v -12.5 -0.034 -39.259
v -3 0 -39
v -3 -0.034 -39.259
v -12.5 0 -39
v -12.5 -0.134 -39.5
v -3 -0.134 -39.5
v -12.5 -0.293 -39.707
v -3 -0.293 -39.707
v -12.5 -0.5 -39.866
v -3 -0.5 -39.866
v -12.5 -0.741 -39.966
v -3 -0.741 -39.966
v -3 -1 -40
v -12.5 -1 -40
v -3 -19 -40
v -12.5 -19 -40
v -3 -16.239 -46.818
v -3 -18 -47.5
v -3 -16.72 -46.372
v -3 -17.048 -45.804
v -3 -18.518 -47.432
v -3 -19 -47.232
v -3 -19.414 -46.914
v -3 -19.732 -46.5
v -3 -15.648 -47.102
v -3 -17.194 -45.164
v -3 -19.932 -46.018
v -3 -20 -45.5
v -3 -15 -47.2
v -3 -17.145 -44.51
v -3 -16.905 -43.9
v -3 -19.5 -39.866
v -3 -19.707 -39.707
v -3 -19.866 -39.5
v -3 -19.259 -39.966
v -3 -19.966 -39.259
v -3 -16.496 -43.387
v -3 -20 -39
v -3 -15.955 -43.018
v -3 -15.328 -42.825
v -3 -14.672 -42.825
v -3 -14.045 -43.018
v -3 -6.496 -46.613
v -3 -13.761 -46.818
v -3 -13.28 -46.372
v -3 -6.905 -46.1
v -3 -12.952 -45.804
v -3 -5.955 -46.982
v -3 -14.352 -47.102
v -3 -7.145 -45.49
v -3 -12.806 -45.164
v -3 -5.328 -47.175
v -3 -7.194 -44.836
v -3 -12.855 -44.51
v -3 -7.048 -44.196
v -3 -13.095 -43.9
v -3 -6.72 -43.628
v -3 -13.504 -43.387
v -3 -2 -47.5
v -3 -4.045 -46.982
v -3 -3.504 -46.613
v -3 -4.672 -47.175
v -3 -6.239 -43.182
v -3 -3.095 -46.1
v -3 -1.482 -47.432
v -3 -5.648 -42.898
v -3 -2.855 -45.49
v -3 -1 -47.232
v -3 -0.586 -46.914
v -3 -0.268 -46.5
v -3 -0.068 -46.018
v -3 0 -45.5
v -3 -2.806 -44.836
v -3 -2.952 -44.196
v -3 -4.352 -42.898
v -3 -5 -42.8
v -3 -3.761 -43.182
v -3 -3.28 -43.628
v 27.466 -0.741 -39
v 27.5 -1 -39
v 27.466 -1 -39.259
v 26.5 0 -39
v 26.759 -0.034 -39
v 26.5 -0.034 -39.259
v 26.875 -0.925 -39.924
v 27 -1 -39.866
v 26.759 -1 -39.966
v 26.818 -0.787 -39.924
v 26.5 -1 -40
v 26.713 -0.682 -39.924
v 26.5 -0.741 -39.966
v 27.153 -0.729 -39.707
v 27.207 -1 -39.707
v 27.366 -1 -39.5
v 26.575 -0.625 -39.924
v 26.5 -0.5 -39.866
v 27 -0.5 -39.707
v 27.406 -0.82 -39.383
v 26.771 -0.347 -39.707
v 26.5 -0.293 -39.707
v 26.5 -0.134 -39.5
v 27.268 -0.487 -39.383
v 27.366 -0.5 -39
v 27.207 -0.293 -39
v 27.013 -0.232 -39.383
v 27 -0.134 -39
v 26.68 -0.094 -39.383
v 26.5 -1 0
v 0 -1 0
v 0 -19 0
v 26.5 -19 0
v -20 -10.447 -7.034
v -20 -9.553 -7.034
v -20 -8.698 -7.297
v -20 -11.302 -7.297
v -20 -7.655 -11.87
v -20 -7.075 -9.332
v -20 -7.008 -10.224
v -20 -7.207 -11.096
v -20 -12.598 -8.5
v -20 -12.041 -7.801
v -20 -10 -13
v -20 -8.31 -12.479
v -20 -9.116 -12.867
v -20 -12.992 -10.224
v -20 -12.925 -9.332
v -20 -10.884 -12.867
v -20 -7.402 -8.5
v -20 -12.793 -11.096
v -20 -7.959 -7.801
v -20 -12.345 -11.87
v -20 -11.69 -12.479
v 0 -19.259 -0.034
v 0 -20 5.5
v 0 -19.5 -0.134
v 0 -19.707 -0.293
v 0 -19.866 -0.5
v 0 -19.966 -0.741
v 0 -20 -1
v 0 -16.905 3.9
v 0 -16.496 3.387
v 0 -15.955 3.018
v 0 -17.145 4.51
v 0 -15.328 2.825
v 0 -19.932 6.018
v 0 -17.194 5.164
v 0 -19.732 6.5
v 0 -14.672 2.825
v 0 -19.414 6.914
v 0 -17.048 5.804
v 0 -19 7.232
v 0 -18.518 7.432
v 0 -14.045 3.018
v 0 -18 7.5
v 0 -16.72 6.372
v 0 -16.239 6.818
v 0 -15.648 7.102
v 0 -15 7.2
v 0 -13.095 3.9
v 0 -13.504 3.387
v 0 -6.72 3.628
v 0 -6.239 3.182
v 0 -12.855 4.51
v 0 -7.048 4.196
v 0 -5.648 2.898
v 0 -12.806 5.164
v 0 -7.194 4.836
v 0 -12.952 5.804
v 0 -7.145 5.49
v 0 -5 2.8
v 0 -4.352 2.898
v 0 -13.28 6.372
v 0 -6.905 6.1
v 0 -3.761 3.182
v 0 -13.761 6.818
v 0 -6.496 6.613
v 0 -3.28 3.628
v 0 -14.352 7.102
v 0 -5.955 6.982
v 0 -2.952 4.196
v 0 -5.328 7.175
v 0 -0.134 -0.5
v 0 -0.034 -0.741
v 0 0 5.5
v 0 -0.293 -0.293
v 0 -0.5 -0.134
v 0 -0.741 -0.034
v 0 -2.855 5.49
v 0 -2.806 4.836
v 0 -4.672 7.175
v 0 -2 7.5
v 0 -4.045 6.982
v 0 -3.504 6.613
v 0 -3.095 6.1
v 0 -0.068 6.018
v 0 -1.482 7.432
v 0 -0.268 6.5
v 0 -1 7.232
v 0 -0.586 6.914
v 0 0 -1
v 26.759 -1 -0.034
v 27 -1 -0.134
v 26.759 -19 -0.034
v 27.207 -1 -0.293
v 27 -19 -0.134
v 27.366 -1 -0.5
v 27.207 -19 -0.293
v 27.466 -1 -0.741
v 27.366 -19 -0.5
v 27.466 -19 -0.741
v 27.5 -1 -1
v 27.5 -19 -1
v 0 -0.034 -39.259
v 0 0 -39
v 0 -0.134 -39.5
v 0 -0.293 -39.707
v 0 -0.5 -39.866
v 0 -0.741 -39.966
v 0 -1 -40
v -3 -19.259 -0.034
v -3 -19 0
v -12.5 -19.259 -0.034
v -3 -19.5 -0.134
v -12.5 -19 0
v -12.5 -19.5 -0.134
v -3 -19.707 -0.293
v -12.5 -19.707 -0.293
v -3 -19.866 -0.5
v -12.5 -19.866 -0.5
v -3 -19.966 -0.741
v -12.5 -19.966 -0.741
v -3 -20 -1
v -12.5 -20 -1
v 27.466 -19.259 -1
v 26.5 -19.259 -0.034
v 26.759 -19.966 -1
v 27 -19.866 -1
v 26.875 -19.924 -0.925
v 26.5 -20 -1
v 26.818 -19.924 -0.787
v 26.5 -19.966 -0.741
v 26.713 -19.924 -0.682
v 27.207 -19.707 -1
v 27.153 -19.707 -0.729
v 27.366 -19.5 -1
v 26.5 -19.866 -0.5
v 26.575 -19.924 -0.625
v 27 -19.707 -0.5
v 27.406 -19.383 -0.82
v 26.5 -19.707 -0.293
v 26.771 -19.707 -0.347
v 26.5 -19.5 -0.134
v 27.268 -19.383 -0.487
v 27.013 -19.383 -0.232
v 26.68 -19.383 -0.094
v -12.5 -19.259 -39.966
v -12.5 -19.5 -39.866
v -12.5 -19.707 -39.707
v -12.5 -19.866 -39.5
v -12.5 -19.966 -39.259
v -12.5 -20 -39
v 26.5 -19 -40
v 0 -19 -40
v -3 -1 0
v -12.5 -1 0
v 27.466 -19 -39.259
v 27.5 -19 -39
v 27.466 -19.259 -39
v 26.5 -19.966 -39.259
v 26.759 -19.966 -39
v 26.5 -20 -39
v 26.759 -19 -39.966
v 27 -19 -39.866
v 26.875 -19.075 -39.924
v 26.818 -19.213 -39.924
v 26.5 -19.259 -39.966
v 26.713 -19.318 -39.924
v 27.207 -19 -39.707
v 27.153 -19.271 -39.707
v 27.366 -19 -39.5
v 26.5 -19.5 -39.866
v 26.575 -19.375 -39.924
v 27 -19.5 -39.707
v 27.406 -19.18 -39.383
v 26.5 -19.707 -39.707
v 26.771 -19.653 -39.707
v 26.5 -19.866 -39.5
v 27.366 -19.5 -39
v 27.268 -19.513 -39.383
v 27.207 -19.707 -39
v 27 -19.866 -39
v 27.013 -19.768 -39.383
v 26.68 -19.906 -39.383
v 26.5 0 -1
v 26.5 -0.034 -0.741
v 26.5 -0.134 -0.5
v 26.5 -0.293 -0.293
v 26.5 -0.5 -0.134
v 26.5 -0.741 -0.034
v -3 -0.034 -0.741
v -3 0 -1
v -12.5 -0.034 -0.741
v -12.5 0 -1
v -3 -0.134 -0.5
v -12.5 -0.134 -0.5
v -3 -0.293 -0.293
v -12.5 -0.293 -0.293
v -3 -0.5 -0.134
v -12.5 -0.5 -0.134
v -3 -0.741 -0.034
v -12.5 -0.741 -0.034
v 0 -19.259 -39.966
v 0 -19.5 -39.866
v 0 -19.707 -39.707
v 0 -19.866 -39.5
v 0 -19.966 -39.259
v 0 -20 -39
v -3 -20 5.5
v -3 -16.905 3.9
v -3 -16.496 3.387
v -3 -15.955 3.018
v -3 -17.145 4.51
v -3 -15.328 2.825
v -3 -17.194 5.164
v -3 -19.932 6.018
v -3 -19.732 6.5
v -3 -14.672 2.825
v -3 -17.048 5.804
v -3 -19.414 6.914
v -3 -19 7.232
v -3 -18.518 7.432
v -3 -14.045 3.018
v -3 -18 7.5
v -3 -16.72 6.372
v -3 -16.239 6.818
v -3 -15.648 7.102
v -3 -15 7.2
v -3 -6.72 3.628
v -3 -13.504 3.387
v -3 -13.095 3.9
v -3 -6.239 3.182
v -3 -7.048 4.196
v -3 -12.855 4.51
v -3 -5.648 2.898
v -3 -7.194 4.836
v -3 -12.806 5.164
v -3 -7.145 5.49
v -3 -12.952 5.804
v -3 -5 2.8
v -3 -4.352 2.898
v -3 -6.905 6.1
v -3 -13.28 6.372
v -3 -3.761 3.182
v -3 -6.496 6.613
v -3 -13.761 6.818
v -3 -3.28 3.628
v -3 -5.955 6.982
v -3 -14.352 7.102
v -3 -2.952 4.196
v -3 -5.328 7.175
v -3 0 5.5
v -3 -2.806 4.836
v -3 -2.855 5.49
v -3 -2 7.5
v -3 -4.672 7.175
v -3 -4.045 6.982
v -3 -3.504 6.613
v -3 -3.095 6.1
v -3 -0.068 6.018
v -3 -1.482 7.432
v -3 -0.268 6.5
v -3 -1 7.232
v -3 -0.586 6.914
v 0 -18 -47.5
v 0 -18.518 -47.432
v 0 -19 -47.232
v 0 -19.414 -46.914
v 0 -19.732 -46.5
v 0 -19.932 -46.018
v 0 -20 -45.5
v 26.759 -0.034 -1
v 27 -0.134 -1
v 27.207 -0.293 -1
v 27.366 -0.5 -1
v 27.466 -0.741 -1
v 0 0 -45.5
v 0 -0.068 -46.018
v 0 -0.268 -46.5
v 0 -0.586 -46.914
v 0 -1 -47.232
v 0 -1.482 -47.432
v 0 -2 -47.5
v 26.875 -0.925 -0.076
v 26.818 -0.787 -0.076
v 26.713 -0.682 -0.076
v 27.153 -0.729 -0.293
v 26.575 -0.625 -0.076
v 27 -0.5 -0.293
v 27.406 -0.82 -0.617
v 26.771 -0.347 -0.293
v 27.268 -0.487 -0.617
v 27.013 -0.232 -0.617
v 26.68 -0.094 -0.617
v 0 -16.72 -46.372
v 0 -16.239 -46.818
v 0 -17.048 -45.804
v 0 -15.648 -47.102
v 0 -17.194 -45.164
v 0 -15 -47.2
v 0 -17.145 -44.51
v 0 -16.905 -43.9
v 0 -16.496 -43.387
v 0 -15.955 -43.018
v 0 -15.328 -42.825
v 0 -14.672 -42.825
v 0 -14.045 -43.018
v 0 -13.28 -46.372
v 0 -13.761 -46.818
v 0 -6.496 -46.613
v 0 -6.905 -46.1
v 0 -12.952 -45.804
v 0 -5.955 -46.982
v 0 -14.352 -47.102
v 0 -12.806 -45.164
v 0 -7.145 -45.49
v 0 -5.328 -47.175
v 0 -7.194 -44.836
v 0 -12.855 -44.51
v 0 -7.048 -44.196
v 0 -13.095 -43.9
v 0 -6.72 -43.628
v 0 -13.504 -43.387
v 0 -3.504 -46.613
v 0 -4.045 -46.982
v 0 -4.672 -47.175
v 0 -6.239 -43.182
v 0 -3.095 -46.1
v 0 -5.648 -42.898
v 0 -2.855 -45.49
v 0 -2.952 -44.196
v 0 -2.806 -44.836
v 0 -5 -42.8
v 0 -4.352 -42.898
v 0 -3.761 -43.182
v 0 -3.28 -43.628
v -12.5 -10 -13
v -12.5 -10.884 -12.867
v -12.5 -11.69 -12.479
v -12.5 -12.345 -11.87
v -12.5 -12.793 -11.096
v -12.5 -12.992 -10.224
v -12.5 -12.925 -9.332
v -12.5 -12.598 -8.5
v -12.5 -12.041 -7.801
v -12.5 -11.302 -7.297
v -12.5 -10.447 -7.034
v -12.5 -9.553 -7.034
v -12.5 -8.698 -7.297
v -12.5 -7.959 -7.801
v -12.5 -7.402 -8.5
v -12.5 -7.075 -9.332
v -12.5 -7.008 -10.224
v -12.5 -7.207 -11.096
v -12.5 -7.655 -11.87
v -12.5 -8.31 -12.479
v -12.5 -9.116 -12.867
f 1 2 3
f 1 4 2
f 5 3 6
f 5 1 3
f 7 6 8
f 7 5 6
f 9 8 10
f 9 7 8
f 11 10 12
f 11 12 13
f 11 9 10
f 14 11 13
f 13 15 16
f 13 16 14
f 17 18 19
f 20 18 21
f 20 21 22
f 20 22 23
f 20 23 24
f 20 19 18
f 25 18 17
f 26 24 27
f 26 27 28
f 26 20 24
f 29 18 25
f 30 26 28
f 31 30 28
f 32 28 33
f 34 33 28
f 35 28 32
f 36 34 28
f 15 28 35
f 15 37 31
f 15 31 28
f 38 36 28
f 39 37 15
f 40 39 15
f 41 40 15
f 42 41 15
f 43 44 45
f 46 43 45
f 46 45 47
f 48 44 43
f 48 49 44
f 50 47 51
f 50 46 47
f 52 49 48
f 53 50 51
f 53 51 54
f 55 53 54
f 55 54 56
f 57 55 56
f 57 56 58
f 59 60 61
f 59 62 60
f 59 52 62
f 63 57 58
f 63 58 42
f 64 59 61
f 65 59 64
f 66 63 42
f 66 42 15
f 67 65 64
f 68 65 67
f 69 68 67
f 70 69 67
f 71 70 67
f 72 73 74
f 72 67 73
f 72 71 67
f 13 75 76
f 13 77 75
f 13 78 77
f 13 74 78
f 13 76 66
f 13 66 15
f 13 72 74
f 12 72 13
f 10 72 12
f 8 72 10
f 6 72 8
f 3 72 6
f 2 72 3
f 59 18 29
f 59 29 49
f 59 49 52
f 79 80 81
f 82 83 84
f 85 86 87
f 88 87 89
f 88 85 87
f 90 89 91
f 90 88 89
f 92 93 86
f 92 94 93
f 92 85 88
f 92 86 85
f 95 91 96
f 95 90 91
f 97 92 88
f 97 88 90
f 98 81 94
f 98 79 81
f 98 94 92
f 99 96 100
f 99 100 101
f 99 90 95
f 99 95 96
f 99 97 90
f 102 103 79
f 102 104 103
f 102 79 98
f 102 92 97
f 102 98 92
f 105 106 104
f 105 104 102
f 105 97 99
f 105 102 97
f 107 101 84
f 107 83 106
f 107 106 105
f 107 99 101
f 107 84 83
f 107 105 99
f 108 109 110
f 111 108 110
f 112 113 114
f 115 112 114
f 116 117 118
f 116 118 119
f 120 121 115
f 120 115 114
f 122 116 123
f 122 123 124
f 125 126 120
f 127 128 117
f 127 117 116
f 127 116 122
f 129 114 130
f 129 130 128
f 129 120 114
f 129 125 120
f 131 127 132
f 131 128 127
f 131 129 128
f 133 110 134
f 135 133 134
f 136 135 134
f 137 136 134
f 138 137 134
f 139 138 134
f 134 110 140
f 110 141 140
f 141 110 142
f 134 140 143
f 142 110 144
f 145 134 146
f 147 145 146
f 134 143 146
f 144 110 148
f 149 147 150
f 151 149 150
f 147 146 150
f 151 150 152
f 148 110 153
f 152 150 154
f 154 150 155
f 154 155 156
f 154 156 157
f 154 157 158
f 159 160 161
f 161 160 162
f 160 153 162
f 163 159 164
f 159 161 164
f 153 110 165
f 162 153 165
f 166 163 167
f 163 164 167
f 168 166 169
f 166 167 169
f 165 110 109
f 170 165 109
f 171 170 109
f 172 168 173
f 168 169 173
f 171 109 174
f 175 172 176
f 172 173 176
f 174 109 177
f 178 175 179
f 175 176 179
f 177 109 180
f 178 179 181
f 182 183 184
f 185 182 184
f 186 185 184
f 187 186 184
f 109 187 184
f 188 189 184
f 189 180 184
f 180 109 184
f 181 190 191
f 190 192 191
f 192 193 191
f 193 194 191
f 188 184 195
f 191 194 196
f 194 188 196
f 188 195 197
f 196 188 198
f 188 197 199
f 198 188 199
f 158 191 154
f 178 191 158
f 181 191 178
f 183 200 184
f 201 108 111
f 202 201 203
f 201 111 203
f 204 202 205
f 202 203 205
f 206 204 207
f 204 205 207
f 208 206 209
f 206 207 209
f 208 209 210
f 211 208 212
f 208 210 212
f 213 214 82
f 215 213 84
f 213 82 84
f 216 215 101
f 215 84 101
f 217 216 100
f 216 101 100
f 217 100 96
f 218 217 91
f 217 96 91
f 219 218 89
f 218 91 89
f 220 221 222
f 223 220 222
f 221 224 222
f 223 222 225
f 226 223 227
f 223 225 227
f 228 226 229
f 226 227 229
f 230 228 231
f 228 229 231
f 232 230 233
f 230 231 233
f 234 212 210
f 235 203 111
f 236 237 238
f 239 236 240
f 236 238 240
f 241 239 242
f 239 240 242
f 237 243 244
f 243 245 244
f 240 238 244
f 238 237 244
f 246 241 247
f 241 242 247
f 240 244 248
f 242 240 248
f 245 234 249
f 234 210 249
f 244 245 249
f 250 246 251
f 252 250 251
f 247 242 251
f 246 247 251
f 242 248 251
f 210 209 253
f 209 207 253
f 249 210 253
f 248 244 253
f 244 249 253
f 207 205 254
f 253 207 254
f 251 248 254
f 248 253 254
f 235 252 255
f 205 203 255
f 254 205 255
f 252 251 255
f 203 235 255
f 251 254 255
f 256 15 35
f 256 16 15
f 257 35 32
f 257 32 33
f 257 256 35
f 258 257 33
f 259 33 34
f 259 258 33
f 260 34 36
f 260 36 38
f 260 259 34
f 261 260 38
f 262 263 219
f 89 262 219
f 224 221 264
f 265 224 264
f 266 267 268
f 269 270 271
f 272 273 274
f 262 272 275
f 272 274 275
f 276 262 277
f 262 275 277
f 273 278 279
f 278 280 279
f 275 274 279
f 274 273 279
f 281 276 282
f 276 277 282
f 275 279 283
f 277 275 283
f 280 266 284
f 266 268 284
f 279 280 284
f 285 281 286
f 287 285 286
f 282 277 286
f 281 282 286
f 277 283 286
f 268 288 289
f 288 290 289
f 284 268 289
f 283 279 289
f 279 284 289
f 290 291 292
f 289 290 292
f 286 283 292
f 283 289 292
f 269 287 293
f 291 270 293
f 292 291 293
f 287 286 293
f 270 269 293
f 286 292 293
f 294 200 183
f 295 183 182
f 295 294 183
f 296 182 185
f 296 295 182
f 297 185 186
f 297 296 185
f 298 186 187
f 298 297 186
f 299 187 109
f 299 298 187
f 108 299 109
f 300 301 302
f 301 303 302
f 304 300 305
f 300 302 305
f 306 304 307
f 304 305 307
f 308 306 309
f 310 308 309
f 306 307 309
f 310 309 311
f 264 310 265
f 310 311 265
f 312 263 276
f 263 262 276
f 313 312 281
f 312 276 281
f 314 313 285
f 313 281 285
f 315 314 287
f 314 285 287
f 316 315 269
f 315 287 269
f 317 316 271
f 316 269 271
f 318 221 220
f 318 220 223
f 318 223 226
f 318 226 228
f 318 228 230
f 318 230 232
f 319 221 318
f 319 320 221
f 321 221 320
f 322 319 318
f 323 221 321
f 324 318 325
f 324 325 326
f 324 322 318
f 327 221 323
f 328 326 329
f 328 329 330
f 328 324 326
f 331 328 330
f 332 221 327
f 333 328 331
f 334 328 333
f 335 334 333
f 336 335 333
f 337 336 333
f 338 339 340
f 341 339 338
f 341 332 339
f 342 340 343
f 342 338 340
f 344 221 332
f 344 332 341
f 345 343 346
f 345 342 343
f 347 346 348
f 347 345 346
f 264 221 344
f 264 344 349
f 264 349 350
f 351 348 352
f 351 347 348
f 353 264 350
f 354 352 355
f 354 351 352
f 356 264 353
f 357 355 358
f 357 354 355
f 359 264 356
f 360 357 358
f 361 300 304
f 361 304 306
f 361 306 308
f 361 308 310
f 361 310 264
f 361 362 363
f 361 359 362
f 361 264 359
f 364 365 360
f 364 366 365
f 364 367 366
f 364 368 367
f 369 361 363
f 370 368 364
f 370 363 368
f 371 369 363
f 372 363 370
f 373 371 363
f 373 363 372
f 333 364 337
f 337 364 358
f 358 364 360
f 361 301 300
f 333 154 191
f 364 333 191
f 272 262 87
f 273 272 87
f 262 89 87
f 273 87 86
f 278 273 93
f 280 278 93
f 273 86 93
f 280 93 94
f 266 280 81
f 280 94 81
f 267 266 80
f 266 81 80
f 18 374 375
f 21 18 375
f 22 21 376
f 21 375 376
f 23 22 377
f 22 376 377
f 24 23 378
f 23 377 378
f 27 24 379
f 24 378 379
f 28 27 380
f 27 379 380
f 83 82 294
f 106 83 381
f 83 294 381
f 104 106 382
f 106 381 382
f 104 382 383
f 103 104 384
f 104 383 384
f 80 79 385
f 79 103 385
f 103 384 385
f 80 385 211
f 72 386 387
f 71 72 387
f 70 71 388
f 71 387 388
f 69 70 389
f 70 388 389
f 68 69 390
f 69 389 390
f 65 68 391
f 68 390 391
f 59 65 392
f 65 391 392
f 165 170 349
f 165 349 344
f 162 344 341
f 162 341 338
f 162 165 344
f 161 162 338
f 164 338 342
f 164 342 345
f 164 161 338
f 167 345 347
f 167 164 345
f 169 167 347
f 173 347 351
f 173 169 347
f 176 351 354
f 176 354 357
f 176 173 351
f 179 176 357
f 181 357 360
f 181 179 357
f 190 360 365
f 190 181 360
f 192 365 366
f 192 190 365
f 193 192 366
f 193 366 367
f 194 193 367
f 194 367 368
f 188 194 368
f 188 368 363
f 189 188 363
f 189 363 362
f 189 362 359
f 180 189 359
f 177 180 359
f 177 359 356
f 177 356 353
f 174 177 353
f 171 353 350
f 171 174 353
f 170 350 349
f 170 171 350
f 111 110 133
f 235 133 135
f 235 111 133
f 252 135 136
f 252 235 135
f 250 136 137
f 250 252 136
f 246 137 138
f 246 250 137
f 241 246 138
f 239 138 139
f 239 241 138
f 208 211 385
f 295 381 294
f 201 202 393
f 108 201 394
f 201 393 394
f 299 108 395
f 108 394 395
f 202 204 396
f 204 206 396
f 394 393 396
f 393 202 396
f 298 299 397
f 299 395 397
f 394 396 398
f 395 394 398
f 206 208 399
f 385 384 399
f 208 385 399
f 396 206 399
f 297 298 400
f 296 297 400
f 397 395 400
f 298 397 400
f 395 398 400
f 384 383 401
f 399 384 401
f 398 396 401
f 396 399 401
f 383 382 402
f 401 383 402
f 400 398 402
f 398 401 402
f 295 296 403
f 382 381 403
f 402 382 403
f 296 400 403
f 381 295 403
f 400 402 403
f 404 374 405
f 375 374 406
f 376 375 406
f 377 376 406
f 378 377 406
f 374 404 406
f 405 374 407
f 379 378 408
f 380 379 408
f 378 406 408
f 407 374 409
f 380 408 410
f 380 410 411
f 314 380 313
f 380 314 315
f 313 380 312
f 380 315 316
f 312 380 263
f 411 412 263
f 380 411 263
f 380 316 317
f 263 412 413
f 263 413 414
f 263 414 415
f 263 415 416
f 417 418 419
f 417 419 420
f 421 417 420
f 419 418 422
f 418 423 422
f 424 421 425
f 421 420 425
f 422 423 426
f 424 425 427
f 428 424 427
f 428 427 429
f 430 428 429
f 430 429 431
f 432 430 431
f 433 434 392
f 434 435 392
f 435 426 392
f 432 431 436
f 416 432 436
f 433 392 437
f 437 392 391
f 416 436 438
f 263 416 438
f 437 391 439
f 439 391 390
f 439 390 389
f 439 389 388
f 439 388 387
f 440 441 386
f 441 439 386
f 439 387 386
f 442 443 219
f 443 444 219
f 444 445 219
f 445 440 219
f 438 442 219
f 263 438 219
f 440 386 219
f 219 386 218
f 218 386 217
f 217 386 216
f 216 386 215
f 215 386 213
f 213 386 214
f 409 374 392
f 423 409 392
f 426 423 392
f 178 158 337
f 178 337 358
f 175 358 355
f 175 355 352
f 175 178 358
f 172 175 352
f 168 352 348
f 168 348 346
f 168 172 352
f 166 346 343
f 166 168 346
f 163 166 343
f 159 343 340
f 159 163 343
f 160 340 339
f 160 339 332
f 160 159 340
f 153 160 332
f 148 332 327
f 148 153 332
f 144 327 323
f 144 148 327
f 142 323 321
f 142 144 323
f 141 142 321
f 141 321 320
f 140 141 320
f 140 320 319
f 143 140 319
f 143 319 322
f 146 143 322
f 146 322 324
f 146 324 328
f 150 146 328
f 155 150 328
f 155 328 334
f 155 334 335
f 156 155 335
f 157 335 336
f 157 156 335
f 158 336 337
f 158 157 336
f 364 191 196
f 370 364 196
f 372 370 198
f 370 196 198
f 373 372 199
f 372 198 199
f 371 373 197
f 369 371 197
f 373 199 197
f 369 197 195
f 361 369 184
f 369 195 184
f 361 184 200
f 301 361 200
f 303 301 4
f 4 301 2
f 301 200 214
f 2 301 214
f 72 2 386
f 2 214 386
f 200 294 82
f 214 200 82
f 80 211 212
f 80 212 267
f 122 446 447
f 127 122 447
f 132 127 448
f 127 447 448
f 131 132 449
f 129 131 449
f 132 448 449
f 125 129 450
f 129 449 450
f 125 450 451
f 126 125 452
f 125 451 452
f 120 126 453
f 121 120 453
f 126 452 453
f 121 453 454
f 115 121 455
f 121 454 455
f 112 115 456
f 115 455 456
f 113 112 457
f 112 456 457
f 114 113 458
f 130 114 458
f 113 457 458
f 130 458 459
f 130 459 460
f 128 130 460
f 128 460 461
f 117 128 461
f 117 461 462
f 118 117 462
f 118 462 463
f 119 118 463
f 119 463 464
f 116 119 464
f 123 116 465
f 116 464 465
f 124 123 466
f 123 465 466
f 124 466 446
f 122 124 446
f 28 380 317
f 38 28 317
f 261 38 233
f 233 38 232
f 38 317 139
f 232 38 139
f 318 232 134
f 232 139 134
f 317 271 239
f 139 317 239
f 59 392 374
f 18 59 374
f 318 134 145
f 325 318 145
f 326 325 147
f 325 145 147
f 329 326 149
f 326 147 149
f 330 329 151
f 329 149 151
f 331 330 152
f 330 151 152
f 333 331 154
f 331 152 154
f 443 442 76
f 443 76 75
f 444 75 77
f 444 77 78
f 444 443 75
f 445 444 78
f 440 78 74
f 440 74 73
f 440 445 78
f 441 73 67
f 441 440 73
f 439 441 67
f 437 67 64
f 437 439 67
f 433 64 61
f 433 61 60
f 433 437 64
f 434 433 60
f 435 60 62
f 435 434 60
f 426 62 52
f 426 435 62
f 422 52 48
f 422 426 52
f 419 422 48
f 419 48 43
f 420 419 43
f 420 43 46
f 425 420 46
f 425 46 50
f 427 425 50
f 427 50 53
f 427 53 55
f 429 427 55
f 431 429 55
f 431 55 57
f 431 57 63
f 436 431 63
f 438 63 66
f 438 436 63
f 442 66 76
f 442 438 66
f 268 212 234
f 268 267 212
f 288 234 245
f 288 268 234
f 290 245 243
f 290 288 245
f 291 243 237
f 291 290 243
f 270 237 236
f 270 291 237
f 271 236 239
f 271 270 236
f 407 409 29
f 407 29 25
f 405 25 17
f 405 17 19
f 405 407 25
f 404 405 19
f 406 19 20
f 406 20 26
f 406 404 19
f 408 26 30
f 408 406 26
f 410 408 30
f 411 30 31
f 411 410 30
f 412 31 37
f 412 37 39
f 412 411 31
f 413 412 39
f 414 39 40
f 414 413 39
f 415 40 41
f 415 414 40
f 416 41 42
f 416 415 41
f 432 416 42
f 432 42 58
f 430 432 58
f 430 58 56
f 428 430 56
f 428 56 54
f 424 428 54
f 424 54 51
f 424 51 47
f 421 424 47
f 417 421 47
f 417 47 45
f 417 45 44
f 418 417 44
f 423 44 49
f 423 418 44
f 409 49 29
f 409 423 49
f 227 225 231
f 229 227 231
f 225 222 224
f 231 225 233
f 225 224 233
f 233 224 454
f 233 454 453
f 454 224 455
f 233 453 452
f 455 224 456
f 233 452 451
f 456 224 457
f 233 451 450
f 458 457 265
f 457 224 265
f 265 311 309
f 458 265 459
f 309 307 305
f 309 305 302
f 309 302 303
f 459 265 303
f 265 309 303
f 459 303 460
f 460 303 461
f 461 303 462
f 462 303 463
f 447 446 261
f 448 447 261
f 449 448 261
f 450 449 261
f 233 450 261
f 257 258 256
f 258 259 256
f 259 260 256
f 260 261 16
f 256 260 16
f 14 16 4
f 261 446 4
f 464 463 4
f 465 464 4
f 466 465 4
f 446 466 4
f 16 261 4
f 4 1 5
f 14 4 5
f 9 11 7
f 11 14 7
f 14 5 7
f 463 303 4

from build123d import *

# Parameters (mm, degrees)
EXTRUDE_1_DEPTH = 27.5
SKETCH_2_R      = 2.2
EXTRUDE_2_DEPTH = 3
SKETCH_3_W      = 40
SKETCH_3_H      = 20
EXTRUDE_3_DEPTH = 40
SKETCH_4_R      = 3
EXTRUDE_4_DEPTH = 7.5
FILLET_1_R      = 1


with BuildPart() as part:
    # ｽｹｯﾁ1 → ﾎﾞｽ - 押し出し1 (new body)
    with BuildSketch(Plane(origin=(0, 0, 0), x_dir=(0, 0, -1), z_dir=(1, 0, 0))):
        Polygon((40, 0), (0, 0), (0, -10), (0, -20), (40, -20), align=None)
    extrude(amount=EXTRUDE_1_DEPTH)

    # ｽｹｯﾁ2 → ﾎﾞｽ - 押し出し2 (add)
    with BuildSketch(Plane.ZY):
        with BuildLine():
            Line((5.5, 0), (-45.5, 0))
            ThreePointArc((-45.5, 0), (-46.914213562, -0.585786438), (-47.5, -2))
            Line((-47.5, -2), (-47.5, -18))
            ThreePointArc((-47.5, -18), (-46.914213562, -19.414213562), (-45.5, -20))
            Line((-45.5, -20), (5.5, -20))
            ThreePointArc((5.5, -20), (6.914213562, -19.414213562), (7.5, -18))
            Line((7.5, -18), (7.5, -2))
            ThreePointArc((7.5, -2), (6.914213562, -0.585786438), (5.5, 0))
        make_face()
        with Locations((-45, -5)):
            Circle(SKETCH_2_R, mode=Mode.SUBTRACT)
        with Locations(Location((5, -5, 0), (0, 0, 180))):
            Circle(SKETCH_2_R, mode=Mode.SUBTRACT)
        with Locations((5, -15)):
            Circle(SKETCH_2_R, mode=Mode.SUBTRACT)
        with Locations(Location((-45, -15, 0), (0, 0, 180))):
            Circle(SKETCH_2_R, mode=Mode.SUBTRACT)
    extrude(amount=EXTRUDE_2_DEPTH)

    # ｽｹｯﾁ3 → ﾎﾞｽ - 押し出し3 (add)
    with BuildSketch(Plane(origin=(27.5, 0, 0), x_dir=(0, 0, -1), z_dir=(1, 0, 0))):
        with Locations((20, -10)):
            Rectangle(SKETCH_3_W, SKETCH_3_H)
    extrude(amount=-EXTRUDE_3_DEPTH)

    # ｽｹｯﾁ4 → ﾎﾞｽ - 押し出し4 (add)
    with BuildSketch(Plane.ZY.offset(12.5)):
        with Locations(Location((-10, -10, 0), (0, 0, 180))):
            Circle(SKETCH_4_R)
    extrude(amount=EXTRUDE_4_DEPTH)

    # ﾌｨﾚｯﾄ1
    fillet_1_edges = [part.edges().sort_by_distance(p)[0] for p in [
        (27.5, 0, -20),
        (27.5, -10, 0),
        (27.5, -20, -20),
        (-7.75, -20, 0),
        (-7.75, 0, 0),
        (-7.75, 0, -40),
        (-7.75, -20, -40),
        (27.5, -10, -40),
        (13.75, -20, -40),
        (13.75, -20, 0),
        (13.75, 0, 0),
        (13.75, 0, -40),
    ]]
    fillet(fillet_1_edges, radius=FILLET_1_R)


solid = part.part
